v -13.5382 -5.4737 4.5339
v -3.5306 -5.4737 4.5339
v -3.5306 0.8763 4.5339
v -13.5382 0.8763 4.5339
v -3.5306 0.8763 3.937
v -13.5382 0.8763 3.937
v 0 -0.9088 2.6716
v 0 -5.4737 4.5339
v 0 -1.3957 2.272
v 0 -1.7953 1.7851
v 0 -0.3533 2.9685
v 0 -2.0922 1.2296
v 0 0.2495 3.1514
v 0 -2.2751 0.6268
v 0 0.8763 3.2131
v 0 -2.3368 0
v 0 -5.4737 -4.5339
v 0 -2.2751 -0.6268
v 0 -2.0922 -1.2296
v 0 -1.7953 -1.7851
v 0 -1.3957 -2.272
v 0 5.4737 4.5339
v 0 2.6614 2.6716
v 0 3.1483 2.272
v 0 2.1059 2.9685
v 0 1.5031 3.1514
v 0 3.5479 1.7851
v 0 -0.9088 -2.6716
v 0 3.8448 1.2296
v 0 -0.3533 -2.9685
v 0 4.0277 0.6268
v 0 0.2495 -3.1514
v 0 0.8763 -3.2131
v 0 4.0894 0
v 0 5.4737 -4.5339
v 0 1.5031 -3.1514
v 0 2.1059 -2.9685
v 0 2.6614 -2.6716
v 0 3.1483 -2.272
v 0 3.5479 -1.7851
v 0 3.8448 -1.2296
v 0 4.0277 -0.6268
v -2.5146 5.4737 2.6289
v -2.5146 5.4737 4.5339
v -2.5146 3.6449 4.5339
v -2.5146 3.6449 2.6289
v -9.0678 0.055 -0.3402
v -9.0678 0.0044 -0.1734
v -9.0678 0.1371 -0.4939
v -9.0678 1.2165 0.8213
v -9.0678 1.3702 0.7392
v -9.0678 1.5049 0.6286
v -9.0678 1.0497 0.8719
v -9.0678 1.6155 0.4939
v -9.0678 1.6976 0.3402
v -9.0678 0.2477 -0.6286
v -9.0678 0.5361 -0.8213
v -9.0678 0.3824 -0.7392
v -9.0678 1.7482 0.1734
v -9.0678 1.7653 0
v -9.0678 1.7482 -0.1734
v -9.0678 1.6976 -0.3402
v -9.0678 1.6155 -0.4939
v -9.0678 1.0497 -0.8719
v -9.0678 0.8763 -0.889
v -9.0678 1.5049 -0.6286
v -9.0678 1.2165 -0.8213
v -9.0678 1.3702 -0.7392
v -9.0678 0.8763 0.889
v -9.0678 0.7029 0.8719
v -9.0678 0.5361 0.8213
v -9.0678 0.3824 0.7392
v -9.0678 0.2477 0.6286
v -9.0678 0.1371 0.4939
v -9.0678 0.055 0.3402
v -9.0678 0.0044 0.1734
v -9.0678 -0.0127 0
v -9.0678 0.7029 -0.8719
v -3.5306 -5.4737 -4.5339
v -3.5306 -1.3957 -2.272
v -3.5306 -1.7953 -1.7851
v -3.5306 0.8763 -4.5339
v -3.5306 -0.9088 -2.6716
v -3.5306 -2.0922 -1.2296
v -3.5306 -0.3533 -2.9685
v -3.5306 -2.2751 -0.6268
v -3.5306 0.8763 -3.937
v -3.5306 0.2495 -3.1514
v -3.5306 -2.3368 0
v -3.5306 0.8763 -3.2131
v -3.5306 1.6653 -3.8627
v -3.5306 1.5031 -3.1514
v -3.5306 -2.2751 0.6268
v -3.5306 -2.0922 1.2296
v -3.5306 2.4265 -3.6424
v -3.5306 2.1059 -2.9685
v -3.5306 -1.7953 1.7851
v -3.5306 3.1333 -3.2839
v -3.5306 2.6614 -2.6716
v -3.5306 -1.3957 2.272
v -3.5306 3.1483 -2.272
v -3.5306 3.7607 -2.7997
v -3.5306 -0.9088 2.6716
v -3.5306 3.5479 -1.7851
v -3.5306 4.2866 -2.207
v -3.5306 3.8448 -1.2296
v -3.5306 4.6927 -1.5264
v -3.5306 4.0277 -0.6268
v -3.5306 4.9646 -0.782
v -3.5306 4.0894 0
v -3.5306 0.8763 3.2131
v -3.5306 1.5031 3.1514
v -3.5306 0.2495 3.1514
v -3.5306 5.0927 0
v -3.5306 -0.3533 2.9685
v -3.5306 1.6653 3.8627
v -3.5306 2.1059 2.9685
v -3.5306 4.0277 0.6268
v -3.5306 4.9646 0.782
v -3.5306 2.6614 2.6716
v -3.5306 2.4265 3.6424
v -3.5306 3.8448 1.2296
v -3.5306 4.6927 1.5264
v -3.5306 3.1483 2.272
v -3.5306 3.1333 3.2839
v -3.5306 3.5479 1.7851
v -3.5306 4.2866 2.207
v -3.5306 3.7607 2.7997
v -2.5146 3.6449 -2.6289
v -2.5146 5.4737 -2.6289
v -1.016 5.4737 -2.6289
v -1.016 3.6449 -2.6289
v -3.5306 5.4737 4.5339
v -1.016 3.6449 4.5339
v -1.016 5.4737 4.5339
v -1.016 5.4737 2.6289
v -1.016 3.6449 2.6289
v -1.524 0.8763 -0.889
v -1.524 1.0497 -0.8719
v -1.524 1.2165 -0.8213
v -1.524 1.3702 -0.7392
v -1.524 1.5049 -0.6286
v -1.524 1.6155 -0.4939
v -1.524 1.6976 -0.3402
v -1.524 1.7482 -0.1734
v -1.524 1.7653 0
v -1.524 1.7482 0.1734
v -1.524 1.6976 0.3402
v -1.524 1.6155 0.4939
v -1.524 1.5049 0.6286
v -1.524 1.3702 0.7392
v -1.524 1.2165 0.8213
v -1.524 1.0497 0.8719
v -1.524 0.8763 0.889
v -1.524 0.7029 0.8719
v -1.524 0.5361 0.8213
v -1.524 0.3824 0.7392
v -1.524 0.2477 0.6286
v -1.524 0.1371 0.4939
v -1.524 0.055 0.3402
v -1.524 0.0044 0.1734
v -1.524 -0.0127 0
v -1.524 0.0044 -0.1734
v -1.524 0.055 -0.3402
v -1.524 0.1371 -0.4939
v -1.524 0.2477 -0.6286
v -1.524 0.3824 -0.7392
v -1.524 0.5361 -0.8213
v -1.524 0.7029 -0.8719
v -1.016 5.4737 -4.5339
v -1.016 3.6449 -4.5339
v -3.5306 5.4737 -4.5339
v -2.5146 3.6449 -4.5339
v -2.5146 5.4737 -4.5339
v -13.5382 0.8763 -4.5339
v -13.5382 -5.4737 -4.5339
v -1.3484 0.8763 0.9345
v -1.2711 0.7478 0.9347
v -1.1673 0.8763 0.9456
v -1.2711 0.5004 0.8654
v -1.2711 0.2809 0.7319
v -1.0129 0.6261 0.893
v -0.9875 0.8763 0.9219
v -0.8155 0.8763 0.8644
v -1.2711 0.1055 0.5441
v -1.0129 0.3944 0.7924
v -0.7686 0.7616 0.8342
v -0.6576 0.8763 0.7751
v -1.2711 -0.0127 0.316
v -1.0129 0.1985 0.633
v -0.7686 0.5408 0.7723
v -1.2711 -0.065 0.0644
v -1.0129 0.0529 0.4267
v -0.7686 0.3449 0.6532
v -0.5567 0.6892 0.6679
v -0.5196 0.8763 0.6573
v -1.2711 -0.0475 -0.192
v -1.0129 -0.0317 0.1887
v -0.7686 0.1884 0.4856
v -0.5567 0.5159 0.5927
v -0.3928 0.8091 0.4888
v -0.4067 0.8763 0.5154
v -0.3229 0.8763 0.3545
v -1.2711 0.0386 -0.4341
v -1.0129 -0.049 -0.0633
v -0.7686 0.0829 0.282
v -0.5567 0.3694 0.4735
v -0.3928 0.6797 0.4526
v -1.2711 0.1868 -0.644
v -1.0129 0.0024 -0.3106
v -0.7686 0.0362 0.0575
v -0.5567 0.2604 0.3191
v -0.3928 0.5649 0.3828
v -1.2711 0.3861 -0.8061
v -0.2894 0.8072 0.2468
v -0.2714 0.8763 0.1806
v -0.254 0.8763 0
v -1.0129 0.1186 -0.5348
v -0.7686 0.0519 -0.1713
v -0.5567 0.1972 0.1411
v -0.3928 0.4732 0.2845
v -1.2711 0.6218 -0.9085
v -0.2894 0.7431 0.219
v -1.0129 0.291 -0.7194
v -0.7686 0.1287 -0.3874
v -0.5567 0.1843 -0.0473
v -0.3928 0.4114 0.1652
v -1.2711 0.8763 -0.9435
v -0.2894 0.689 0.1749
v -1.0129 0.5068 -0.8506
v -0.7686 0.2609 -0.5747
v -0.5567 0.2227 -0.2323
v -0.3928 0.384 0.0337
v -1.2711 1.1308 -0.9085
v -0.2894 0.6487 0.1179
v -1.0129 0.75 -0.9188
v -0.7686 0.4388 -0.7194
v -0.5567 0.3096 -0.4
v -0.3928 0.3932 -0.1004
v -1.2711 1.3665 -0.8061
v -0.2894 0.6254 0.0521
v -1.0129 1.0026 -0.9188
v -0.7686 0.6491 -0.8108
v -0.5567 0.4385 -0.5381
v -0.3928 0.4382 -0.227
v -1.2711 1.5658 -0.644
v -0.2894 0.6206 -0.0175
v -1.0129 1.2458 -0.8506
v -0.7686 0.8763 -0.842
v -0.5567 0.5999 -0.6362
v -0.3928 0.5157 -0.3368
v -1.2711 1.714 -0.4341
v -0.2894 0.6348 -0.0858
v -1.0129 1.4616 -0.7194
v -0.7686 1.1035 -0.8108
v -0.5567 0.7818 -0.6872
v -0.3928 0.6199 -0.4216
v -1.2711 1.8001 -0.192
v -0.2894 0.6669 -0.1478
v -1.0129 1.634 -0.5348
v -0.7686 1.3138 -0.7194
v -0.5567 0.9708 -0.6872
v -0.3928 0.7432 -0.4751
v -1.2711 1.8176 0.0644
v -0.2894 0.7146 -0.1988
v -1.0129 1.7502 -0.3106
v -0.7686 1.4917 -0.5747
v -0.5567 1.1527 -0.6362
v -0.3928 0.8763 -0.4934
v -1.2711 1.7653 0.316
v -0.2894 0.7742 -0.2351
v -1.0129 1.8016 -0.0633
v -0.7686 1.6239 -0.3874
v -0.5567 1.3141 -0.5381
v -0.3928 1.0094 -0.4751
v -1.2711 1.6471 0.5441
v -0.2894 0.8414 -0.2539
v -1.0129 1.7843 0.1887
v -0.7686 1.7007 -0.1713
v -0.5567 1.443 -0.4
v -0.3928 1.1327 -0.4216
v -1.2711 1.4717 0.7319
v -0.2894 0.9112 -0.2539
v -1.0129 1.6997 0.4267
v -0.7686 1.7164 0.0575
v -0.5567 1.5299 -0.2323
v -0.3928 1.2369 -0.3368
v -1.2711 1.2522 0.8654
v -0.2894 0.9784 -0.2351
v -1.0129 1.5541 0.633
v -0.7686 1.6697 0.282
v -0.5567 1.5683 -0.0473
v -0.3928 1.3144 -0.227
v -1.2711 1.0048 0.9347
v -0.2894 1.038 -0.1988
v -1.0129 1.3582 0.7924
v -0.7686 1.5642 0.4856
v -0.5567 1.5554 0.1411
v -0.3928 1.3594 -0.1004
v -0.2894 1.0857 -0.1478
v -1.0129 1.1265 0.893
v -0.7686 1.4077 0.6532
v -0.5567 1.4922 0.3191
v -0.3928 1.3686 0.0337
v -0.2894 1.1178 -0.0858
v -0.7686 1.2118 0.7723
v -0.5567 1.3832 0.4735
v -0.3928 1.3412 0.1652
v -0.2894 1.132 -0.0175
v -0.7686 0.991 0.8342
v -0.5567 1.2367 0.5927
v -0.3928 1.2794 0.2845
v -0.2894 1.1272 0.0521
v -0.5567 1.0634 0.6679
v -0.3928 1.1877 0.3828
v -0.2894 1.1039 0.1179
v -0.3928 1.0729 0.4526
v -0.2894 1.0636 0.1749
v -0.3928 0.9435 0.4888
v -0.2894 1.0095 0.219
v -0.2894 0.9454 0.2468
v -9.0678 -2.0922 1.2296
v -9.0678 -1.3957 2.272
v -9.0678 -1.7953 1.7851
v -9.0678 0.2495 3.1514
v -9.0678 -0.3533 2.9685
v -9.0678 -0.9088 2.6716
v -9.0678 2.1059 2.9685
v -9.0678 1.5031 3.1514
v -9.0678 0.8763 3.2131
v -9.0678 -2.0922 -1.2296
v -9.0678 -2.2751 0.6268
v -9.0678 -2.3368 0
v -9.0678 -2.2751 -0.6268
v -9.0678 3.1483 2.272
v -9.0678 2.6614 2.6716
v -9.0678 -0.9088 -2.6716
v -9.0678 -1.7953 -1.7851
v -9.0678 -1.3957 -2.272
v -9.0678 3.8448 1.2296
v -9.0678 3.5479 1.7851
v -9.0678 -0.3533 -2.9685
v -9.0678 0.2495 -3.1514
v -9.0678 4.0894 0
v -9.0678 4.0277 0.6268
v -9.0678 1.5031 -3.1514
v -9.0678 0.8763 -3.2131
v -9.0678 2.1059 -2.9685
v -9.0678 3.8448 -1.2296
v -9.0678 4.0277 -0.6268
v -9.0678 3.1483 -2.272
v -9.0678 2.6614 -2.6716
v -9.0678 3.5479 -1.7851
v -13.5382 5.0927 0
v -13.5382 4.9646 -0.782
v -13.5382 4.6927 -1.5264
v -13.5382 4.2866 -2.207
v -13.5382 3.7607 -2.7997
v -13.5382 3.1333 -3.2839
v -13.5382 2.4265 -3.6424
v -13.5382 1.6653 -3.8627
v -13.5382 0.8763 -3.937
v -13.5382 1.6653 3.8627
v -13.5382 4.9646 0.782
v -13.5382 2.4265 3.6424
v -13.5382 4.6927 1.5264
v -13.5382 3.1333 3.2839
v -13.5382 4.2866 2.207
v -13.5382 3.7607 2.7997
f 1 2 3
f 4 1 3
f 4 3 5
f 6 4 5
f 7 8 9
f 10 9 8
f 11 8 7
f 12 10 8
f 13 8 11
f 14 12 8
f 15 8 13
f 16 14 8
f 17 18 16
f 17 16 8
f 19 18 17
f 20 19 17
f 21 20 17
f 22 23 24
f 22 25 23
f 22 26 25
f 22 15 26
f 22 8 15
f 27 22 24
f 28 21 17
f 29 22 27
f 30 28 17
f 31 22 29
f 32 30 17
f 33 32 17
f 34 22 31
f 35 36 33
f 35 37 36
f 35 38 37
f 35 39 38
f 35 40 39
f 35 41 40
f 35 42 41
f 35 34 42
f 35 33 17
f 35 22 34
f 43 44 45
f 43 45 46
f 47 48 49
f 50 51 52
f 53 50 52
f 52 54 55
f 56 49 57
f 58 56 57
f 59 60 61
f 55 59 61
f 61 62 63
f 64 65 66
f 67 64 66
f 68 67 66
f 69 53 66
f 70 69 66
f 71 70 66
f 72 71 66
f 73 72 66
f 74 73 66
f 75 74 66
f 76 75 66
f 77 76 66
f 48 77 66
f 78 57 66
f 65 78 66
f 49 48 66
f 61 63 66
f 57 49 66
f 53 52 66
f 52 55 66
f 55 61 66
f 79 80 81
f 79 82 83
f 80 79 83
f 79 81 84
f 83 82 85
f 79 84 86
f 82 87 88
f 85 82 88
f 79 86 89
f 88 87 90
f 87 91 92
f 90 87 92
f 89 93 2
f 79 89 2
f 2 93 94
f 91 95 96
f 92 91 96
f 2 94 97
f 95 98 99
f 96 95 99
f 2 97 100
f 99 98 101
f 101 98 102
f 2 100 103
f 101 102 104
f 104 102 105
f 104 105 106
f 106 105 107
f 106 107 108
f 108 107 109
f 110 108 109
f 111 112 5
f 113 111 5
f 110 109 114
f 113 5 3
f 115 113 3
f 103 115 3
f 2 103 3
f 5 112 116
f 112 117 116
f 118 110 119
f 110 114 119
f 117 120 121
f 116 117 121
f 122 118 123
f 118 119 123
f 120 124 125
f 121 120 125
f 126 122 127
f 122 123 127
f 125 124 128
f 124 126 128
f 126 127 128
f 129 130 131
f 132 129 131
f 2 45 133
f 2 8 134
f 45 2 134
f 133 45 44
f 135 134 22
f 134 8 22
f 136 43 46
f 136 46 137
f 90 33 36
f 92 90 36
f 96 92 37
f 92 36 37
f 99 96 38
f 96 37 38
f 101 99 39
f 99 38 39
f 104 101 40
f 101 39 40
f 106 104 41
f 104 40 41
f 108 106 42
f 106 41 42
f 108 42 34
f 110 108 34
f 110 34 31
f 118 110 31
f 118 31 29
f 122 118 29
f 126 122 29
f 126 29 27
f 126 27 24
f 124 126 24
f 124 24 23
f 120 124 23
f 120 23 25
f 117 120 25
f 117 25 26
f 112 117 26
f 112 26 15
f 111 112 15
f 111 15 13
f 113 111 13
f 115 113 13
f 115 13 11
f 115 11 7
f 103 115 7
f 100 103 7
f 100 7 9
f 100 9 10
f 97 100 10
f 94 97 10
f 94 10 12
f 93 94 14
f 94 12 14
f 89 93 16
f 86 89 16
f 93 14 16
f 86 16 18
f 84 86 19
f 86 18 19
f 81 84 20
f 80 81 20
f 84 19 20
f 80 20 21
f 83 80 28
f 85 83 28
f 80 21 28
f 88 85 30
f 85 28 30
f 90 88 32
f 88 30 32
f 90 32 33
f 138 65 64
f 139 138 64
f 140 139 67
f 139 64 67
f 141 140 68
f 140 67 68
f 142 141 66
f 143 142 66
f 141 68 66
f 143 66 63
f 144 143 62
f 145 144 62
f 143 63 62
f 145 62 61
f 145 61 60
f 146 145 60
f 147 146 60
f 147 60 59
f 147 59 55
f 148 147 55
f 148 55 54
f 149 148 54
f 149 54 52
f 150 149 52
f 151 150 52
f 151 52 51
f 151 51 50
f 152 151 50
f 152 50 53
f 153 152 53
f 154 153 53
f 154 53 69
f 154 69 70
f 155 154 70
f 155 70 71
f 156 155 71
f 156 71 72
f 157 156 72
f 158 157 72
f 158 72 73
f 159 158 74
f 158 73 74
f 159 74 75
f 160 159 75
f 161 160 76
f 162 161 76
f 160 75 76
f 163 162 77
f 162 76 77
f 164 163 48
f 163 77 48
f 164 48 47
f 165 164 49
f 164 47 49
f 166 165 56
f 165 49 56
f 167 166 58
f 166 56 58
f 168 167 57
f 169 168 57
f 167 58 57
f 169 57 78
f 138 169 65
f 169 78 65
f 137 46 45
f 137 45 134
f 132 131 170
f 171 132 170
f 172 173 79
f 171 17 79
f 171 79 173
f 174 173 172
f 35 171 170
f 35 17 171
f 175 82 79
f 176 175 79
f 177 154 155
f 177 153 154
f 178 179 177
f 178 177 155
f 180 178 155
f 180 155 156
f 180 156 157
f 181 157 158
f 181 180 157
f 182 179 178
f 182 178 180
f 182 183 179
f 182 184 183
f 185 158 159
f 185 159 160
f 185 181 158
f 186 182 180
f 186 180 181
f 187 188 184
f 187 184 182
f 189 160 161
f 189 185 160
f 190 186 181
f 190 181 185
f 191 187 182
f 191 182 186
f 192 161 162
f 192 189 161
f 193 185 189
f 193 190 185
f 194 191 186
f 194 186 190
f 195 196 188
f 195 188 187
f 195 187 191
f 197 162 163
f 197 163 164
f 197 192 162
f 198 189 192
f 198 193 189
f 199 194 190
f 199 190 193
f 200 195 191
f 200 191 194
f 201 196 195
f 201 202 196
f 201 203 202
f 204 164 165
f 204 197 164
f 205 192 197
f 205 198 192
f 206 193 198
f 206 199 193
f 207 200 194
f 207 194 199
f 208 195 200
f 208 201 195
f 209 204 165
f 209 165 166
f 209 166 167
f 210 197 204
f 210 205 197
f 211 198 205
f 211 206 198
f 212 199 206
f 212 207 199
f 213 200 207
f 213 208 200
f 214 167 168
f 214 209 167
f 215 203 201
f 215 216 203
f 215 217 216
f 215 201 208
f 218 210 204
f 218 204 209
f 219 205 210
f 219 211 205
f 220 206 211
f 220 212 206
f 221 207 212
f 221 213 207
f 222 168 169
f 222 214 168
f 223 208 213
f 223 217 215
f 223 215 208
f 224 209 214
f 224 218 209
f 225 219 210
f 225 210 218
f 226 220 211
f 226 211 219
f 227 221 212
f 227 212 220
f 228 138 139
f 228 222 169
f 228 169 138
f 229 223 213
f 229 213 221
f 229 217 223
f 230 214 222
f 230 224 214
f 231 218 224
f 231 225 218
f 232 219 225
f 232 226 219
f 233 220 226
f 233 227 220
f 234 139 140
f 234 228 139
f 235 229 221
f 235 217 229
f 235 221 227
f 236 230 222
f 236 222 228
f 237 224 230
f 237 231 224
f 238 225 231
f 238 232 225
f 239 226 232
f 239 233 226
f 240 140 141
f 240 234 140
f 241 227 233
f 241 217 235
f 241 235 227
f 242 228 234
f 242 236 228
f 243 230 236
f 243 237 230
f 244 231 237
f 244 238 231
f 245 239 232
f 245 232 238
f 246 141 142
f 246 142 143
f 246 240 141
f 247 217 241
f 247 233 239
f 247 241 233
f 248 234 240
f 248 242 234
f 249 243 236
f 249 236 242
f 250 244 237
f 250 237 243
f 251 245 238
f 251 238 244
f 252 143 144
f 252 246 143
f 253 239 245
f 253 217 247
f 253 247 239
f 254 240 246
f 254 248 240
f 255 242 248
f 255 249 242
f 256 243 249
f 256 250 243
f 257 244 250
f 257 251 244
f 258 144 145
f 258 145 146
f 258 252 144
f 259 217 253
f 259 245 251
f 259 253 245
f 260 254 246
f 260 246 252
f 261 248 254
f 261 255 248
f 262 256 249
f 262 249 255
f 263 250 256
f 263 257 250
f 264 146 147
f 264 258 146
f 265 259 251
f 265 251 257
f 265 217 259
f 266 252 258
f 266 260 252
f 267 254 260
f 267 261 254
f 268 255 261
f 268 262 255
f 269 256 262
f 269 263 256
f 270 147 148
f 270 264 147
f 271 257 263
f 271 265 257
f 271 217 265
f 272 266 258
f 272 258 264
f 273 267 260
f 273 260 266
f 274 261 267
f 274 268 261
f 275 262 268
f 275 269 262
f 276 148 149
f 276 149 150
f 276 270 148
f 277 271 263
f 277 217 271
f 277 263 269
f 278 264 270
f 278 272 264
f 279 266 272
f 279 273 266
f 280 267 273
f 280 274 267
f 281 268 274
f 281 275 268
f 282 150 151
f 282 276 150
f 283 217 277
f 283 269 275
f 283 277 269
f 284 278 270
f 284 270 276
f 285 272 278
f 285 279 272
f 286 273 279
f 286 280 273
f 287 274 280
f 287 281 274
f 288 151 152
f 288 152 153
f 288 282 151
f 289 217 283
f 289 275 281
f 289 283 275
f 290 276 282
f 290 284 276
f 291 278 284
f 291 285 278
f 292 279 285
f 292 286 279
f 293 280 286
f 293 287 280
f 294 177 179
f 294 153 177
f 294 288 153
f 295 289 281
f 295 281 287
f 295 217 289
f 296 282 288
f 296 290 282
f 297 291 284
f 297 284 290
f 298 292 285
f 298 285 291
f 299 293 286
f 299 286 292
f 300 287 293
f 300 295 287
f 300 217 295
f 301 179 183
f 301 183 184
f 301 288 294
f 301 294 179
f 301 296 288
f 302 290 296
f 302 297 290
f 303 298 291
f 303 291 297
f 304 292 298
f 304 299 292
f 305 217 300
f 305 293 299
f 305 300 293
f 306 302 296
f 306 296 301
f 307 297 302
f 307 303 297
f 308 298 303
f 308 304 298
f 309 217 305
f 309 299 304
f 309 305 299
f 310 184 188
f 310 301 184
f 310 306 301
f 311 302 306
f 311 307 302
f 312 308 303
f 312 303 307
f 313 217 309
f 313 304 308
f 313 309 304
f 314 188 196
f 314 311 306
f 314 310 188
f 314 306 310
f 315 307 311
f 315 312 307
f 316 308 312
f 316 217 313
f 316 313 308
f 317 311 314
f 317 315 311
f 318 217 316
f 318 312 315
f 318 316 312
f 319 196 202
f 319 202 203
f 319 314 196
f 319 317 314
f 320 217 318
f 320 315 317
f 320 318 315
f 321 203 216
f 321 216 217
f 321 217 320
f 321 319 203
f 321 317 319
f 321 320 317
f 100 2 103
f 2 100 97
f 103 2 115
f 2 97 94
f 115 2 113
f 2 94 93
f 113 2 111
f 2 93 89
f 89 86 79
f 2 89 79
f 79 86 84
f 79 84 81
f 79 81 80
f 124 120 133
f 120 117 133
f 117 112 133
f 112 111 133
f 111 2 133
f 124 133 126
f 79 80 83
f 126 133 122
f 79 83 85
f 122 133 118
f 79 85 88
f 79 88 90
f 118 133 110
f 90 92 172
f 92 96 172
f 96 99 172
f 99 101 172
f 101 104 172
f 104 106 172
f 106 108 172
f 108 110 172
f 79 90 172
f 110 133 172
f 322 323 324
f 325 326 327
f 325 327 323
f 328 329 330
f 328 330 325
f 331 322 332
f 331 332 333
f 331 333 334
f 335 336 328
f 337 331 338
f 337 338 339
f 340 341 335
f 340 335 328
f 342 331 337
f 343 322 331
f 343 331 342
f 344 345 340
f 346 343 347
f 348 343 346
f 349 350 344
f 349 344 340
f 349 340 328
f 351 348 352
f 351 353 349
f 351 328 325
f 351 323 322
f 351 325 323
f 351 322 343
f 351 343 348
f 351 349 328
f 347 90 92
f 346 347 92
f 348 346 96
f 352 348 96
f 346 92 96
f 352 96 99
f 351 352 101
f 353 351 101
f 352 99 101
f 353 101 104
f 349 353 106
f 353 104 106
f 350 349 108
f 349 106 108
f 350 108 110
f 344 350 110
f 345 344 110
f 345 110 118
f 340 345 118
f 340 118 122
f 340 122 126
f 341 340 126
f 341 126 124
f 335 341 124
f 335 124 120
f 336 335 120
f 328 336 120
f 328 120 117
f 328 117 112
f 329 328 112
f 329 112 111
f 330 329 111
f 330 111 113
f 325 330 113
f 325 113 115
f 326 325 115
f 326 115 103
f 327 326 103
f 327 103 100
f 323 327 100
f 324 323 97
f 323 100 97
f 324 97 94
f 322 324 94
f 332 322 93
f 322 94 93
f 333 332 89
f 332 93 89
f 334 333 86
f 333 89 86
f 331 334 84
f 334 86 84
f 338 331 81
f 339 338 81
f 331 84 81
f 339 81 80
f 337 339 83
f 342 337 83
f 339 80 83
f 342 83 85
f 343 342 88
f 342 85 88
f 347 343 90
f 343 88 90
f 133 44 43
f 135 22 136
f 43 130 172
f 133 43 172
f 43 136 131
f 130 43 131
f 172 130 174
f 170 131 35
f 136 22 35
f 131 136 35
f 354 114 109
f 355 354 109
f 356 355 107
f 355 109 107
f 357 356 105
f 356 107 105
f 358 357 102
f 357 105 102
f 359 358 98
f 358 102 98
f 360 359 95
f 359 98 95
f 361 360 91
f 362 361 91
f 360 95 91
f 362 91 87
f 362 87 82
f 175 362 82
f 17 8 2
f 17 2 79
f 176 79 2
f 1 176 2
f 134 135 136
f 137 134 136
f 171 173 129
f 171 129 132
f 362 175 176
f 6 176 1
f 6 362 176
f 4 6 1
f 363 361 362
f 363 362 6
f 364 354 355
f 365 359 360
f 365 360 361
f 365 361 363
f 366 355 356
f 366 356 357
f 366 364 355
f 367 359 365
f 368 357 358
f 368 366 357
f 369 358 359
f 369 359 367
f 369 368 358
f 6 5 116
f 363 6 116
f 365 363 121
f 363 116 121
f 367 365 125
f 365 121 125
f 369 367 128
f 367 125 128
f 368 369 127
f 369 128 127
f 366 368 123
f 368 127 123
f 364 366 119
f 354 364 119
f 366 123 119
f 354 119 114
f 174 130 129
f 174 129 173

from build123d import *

# Parameters (mm, degrees)
SKETCH1_W         = 9.0678
SKETCH1_H         = 10.9474
EXTRUDE1_DEPTH    = 3.5306
EXTRUDE2_DEPTH    = 10.0076
SKETCH3_R         = 3.2131
EXTRUDE3_DEPTH    = 9.0678
SKETCH4_R         = 0.889
EXTRUDE4_DEPTH    = 7.5438
DOME1_FACE_RADIUS = 0.889
DOME1_HEIGHT      = 1.27
SKETCH5_W         = 1.4986
SKETCH5_H         = 3.175
EXTRUDE5_DEPTH    = 1.8288


with BuildPart() as part:
    # Sketch1 → Extrude1 (new body)
    with BuildSketch(Plane(origin=(0, 0, 0), x_dir=(0, 0, -1), z_dir=(1, 0, 0))):
        Rectangle(SKETCH1_W, SKETCH1_H)
    extrude(amount=-EXTRUDE1_DEPTH)


with BuildPart() as body_2:
    # Sketch2 → Extrude2 (new body)
    with BuildSketch(Plane.ZY.offset(3.5306)):
        with BuildLine():
            Line((-4.5339, -5.4737), (4.5339, -5.4737))
            Line((4.5339, -5.4737), (4.5339, 0.8763))
            Line((4.5339, 0.8763), (3.937, 0.8763))
            ThreePointArc((3.937, 0.8763), (2.799736174, 3.760654259), (0, 5.0927))
            ThreePointArc((0, 5.0927), (-2.799736174, 3.760654259), (-3.937, 0.8763))
            Line((-3.937, 0.8763), (-4.5339, 0.8763))
            Line((-4.5339, 0.8763), (-4.5339, -5.4737))
        make_face()
    extrude(amount=EXTRUDE2_DEPTH)


with BuildPart() as extrude3_tool:
    # Sketch3 → Extrude3 (new body)
    with BuildSketch(Plane(origin=(0, 0, 0), x_dir=(0, 0, -1), z_dir=(1, 0, 0))):
        with Locations((0, 0.8763)):
            Circle(SKETCH3_R)
    extrude(amount=-EXTRUDE3_DEPTH)


with BuildPart() as part_1:
    add(part.part)

    # Extrude3: cut by extrude3_tool
    add(extrude3_tool.part, mode=Mode.SUBTRACT)

    # Sketch5 → Extrude5 (cut)
    with BuildSketch(Plane(origin=(0, 5.4737, 0), x_dir=(1, 0, 0), z_dir=(0, 1, 0))):
        with Locations((-1.7653, -4.2164)):
            Rectangle(SKETCH5_W, SKETCH5_H)
        with Locations((-1.7653, 4.2164)):
            Rectangle(SKETCH5_W, SKETCH5_H)
    extrude(amount=-EXTRUDE5_DEPTH, mode=Mode.SUBTRACT)


with BuildPart() as body_2_1:
    add(body_2.part)

    # Extrude3: cut by extrude3_tool
    add(extrude3_tool.part, mode=Mode.SUBTRACT)


with BuildPart() as body_3:
    # Sketch4 → Extrude4 (new body)
    with BuildSketch(Plane(origin=(-9.0678, 0, 0), x_dir=(0, 0, -1), z_dir=(1, 0, 0))):
        with Locations((0, 0.8763)):
            Circle(SKETCH4_R)
    extrude(amount=EXTRUDE4_DEPTH)

    # Dome1: a dome of height H over a round flat face of radius A is a cap of a sphere of radius (A * A + H * H) / (2 * H)
    dome1_r = (DOME1_FACE_RADIUS * DOME1_FACE_RADIUS + DOME1_HEIGHT * DOME1_HEIGHT) / (2 * DOME1_HEIGHT)
    dome1_base = Plane((-1.524, 0.8763, 0), z_dir=(1, 0, 0))
    with Locations(dome1_base.offset(DOME1_HEIGHT - dome1_r)):
        dome1_ball = Sphere(dome1_r, mode=Mode.PRIVATE)
    add(split(dome1_ball, bisect_by=dome1_base, keep=Keep.TOP, mode=Mode.PRIVATE))


solid = Compound([part_1.part, body_2_1.part, body_3.part])
